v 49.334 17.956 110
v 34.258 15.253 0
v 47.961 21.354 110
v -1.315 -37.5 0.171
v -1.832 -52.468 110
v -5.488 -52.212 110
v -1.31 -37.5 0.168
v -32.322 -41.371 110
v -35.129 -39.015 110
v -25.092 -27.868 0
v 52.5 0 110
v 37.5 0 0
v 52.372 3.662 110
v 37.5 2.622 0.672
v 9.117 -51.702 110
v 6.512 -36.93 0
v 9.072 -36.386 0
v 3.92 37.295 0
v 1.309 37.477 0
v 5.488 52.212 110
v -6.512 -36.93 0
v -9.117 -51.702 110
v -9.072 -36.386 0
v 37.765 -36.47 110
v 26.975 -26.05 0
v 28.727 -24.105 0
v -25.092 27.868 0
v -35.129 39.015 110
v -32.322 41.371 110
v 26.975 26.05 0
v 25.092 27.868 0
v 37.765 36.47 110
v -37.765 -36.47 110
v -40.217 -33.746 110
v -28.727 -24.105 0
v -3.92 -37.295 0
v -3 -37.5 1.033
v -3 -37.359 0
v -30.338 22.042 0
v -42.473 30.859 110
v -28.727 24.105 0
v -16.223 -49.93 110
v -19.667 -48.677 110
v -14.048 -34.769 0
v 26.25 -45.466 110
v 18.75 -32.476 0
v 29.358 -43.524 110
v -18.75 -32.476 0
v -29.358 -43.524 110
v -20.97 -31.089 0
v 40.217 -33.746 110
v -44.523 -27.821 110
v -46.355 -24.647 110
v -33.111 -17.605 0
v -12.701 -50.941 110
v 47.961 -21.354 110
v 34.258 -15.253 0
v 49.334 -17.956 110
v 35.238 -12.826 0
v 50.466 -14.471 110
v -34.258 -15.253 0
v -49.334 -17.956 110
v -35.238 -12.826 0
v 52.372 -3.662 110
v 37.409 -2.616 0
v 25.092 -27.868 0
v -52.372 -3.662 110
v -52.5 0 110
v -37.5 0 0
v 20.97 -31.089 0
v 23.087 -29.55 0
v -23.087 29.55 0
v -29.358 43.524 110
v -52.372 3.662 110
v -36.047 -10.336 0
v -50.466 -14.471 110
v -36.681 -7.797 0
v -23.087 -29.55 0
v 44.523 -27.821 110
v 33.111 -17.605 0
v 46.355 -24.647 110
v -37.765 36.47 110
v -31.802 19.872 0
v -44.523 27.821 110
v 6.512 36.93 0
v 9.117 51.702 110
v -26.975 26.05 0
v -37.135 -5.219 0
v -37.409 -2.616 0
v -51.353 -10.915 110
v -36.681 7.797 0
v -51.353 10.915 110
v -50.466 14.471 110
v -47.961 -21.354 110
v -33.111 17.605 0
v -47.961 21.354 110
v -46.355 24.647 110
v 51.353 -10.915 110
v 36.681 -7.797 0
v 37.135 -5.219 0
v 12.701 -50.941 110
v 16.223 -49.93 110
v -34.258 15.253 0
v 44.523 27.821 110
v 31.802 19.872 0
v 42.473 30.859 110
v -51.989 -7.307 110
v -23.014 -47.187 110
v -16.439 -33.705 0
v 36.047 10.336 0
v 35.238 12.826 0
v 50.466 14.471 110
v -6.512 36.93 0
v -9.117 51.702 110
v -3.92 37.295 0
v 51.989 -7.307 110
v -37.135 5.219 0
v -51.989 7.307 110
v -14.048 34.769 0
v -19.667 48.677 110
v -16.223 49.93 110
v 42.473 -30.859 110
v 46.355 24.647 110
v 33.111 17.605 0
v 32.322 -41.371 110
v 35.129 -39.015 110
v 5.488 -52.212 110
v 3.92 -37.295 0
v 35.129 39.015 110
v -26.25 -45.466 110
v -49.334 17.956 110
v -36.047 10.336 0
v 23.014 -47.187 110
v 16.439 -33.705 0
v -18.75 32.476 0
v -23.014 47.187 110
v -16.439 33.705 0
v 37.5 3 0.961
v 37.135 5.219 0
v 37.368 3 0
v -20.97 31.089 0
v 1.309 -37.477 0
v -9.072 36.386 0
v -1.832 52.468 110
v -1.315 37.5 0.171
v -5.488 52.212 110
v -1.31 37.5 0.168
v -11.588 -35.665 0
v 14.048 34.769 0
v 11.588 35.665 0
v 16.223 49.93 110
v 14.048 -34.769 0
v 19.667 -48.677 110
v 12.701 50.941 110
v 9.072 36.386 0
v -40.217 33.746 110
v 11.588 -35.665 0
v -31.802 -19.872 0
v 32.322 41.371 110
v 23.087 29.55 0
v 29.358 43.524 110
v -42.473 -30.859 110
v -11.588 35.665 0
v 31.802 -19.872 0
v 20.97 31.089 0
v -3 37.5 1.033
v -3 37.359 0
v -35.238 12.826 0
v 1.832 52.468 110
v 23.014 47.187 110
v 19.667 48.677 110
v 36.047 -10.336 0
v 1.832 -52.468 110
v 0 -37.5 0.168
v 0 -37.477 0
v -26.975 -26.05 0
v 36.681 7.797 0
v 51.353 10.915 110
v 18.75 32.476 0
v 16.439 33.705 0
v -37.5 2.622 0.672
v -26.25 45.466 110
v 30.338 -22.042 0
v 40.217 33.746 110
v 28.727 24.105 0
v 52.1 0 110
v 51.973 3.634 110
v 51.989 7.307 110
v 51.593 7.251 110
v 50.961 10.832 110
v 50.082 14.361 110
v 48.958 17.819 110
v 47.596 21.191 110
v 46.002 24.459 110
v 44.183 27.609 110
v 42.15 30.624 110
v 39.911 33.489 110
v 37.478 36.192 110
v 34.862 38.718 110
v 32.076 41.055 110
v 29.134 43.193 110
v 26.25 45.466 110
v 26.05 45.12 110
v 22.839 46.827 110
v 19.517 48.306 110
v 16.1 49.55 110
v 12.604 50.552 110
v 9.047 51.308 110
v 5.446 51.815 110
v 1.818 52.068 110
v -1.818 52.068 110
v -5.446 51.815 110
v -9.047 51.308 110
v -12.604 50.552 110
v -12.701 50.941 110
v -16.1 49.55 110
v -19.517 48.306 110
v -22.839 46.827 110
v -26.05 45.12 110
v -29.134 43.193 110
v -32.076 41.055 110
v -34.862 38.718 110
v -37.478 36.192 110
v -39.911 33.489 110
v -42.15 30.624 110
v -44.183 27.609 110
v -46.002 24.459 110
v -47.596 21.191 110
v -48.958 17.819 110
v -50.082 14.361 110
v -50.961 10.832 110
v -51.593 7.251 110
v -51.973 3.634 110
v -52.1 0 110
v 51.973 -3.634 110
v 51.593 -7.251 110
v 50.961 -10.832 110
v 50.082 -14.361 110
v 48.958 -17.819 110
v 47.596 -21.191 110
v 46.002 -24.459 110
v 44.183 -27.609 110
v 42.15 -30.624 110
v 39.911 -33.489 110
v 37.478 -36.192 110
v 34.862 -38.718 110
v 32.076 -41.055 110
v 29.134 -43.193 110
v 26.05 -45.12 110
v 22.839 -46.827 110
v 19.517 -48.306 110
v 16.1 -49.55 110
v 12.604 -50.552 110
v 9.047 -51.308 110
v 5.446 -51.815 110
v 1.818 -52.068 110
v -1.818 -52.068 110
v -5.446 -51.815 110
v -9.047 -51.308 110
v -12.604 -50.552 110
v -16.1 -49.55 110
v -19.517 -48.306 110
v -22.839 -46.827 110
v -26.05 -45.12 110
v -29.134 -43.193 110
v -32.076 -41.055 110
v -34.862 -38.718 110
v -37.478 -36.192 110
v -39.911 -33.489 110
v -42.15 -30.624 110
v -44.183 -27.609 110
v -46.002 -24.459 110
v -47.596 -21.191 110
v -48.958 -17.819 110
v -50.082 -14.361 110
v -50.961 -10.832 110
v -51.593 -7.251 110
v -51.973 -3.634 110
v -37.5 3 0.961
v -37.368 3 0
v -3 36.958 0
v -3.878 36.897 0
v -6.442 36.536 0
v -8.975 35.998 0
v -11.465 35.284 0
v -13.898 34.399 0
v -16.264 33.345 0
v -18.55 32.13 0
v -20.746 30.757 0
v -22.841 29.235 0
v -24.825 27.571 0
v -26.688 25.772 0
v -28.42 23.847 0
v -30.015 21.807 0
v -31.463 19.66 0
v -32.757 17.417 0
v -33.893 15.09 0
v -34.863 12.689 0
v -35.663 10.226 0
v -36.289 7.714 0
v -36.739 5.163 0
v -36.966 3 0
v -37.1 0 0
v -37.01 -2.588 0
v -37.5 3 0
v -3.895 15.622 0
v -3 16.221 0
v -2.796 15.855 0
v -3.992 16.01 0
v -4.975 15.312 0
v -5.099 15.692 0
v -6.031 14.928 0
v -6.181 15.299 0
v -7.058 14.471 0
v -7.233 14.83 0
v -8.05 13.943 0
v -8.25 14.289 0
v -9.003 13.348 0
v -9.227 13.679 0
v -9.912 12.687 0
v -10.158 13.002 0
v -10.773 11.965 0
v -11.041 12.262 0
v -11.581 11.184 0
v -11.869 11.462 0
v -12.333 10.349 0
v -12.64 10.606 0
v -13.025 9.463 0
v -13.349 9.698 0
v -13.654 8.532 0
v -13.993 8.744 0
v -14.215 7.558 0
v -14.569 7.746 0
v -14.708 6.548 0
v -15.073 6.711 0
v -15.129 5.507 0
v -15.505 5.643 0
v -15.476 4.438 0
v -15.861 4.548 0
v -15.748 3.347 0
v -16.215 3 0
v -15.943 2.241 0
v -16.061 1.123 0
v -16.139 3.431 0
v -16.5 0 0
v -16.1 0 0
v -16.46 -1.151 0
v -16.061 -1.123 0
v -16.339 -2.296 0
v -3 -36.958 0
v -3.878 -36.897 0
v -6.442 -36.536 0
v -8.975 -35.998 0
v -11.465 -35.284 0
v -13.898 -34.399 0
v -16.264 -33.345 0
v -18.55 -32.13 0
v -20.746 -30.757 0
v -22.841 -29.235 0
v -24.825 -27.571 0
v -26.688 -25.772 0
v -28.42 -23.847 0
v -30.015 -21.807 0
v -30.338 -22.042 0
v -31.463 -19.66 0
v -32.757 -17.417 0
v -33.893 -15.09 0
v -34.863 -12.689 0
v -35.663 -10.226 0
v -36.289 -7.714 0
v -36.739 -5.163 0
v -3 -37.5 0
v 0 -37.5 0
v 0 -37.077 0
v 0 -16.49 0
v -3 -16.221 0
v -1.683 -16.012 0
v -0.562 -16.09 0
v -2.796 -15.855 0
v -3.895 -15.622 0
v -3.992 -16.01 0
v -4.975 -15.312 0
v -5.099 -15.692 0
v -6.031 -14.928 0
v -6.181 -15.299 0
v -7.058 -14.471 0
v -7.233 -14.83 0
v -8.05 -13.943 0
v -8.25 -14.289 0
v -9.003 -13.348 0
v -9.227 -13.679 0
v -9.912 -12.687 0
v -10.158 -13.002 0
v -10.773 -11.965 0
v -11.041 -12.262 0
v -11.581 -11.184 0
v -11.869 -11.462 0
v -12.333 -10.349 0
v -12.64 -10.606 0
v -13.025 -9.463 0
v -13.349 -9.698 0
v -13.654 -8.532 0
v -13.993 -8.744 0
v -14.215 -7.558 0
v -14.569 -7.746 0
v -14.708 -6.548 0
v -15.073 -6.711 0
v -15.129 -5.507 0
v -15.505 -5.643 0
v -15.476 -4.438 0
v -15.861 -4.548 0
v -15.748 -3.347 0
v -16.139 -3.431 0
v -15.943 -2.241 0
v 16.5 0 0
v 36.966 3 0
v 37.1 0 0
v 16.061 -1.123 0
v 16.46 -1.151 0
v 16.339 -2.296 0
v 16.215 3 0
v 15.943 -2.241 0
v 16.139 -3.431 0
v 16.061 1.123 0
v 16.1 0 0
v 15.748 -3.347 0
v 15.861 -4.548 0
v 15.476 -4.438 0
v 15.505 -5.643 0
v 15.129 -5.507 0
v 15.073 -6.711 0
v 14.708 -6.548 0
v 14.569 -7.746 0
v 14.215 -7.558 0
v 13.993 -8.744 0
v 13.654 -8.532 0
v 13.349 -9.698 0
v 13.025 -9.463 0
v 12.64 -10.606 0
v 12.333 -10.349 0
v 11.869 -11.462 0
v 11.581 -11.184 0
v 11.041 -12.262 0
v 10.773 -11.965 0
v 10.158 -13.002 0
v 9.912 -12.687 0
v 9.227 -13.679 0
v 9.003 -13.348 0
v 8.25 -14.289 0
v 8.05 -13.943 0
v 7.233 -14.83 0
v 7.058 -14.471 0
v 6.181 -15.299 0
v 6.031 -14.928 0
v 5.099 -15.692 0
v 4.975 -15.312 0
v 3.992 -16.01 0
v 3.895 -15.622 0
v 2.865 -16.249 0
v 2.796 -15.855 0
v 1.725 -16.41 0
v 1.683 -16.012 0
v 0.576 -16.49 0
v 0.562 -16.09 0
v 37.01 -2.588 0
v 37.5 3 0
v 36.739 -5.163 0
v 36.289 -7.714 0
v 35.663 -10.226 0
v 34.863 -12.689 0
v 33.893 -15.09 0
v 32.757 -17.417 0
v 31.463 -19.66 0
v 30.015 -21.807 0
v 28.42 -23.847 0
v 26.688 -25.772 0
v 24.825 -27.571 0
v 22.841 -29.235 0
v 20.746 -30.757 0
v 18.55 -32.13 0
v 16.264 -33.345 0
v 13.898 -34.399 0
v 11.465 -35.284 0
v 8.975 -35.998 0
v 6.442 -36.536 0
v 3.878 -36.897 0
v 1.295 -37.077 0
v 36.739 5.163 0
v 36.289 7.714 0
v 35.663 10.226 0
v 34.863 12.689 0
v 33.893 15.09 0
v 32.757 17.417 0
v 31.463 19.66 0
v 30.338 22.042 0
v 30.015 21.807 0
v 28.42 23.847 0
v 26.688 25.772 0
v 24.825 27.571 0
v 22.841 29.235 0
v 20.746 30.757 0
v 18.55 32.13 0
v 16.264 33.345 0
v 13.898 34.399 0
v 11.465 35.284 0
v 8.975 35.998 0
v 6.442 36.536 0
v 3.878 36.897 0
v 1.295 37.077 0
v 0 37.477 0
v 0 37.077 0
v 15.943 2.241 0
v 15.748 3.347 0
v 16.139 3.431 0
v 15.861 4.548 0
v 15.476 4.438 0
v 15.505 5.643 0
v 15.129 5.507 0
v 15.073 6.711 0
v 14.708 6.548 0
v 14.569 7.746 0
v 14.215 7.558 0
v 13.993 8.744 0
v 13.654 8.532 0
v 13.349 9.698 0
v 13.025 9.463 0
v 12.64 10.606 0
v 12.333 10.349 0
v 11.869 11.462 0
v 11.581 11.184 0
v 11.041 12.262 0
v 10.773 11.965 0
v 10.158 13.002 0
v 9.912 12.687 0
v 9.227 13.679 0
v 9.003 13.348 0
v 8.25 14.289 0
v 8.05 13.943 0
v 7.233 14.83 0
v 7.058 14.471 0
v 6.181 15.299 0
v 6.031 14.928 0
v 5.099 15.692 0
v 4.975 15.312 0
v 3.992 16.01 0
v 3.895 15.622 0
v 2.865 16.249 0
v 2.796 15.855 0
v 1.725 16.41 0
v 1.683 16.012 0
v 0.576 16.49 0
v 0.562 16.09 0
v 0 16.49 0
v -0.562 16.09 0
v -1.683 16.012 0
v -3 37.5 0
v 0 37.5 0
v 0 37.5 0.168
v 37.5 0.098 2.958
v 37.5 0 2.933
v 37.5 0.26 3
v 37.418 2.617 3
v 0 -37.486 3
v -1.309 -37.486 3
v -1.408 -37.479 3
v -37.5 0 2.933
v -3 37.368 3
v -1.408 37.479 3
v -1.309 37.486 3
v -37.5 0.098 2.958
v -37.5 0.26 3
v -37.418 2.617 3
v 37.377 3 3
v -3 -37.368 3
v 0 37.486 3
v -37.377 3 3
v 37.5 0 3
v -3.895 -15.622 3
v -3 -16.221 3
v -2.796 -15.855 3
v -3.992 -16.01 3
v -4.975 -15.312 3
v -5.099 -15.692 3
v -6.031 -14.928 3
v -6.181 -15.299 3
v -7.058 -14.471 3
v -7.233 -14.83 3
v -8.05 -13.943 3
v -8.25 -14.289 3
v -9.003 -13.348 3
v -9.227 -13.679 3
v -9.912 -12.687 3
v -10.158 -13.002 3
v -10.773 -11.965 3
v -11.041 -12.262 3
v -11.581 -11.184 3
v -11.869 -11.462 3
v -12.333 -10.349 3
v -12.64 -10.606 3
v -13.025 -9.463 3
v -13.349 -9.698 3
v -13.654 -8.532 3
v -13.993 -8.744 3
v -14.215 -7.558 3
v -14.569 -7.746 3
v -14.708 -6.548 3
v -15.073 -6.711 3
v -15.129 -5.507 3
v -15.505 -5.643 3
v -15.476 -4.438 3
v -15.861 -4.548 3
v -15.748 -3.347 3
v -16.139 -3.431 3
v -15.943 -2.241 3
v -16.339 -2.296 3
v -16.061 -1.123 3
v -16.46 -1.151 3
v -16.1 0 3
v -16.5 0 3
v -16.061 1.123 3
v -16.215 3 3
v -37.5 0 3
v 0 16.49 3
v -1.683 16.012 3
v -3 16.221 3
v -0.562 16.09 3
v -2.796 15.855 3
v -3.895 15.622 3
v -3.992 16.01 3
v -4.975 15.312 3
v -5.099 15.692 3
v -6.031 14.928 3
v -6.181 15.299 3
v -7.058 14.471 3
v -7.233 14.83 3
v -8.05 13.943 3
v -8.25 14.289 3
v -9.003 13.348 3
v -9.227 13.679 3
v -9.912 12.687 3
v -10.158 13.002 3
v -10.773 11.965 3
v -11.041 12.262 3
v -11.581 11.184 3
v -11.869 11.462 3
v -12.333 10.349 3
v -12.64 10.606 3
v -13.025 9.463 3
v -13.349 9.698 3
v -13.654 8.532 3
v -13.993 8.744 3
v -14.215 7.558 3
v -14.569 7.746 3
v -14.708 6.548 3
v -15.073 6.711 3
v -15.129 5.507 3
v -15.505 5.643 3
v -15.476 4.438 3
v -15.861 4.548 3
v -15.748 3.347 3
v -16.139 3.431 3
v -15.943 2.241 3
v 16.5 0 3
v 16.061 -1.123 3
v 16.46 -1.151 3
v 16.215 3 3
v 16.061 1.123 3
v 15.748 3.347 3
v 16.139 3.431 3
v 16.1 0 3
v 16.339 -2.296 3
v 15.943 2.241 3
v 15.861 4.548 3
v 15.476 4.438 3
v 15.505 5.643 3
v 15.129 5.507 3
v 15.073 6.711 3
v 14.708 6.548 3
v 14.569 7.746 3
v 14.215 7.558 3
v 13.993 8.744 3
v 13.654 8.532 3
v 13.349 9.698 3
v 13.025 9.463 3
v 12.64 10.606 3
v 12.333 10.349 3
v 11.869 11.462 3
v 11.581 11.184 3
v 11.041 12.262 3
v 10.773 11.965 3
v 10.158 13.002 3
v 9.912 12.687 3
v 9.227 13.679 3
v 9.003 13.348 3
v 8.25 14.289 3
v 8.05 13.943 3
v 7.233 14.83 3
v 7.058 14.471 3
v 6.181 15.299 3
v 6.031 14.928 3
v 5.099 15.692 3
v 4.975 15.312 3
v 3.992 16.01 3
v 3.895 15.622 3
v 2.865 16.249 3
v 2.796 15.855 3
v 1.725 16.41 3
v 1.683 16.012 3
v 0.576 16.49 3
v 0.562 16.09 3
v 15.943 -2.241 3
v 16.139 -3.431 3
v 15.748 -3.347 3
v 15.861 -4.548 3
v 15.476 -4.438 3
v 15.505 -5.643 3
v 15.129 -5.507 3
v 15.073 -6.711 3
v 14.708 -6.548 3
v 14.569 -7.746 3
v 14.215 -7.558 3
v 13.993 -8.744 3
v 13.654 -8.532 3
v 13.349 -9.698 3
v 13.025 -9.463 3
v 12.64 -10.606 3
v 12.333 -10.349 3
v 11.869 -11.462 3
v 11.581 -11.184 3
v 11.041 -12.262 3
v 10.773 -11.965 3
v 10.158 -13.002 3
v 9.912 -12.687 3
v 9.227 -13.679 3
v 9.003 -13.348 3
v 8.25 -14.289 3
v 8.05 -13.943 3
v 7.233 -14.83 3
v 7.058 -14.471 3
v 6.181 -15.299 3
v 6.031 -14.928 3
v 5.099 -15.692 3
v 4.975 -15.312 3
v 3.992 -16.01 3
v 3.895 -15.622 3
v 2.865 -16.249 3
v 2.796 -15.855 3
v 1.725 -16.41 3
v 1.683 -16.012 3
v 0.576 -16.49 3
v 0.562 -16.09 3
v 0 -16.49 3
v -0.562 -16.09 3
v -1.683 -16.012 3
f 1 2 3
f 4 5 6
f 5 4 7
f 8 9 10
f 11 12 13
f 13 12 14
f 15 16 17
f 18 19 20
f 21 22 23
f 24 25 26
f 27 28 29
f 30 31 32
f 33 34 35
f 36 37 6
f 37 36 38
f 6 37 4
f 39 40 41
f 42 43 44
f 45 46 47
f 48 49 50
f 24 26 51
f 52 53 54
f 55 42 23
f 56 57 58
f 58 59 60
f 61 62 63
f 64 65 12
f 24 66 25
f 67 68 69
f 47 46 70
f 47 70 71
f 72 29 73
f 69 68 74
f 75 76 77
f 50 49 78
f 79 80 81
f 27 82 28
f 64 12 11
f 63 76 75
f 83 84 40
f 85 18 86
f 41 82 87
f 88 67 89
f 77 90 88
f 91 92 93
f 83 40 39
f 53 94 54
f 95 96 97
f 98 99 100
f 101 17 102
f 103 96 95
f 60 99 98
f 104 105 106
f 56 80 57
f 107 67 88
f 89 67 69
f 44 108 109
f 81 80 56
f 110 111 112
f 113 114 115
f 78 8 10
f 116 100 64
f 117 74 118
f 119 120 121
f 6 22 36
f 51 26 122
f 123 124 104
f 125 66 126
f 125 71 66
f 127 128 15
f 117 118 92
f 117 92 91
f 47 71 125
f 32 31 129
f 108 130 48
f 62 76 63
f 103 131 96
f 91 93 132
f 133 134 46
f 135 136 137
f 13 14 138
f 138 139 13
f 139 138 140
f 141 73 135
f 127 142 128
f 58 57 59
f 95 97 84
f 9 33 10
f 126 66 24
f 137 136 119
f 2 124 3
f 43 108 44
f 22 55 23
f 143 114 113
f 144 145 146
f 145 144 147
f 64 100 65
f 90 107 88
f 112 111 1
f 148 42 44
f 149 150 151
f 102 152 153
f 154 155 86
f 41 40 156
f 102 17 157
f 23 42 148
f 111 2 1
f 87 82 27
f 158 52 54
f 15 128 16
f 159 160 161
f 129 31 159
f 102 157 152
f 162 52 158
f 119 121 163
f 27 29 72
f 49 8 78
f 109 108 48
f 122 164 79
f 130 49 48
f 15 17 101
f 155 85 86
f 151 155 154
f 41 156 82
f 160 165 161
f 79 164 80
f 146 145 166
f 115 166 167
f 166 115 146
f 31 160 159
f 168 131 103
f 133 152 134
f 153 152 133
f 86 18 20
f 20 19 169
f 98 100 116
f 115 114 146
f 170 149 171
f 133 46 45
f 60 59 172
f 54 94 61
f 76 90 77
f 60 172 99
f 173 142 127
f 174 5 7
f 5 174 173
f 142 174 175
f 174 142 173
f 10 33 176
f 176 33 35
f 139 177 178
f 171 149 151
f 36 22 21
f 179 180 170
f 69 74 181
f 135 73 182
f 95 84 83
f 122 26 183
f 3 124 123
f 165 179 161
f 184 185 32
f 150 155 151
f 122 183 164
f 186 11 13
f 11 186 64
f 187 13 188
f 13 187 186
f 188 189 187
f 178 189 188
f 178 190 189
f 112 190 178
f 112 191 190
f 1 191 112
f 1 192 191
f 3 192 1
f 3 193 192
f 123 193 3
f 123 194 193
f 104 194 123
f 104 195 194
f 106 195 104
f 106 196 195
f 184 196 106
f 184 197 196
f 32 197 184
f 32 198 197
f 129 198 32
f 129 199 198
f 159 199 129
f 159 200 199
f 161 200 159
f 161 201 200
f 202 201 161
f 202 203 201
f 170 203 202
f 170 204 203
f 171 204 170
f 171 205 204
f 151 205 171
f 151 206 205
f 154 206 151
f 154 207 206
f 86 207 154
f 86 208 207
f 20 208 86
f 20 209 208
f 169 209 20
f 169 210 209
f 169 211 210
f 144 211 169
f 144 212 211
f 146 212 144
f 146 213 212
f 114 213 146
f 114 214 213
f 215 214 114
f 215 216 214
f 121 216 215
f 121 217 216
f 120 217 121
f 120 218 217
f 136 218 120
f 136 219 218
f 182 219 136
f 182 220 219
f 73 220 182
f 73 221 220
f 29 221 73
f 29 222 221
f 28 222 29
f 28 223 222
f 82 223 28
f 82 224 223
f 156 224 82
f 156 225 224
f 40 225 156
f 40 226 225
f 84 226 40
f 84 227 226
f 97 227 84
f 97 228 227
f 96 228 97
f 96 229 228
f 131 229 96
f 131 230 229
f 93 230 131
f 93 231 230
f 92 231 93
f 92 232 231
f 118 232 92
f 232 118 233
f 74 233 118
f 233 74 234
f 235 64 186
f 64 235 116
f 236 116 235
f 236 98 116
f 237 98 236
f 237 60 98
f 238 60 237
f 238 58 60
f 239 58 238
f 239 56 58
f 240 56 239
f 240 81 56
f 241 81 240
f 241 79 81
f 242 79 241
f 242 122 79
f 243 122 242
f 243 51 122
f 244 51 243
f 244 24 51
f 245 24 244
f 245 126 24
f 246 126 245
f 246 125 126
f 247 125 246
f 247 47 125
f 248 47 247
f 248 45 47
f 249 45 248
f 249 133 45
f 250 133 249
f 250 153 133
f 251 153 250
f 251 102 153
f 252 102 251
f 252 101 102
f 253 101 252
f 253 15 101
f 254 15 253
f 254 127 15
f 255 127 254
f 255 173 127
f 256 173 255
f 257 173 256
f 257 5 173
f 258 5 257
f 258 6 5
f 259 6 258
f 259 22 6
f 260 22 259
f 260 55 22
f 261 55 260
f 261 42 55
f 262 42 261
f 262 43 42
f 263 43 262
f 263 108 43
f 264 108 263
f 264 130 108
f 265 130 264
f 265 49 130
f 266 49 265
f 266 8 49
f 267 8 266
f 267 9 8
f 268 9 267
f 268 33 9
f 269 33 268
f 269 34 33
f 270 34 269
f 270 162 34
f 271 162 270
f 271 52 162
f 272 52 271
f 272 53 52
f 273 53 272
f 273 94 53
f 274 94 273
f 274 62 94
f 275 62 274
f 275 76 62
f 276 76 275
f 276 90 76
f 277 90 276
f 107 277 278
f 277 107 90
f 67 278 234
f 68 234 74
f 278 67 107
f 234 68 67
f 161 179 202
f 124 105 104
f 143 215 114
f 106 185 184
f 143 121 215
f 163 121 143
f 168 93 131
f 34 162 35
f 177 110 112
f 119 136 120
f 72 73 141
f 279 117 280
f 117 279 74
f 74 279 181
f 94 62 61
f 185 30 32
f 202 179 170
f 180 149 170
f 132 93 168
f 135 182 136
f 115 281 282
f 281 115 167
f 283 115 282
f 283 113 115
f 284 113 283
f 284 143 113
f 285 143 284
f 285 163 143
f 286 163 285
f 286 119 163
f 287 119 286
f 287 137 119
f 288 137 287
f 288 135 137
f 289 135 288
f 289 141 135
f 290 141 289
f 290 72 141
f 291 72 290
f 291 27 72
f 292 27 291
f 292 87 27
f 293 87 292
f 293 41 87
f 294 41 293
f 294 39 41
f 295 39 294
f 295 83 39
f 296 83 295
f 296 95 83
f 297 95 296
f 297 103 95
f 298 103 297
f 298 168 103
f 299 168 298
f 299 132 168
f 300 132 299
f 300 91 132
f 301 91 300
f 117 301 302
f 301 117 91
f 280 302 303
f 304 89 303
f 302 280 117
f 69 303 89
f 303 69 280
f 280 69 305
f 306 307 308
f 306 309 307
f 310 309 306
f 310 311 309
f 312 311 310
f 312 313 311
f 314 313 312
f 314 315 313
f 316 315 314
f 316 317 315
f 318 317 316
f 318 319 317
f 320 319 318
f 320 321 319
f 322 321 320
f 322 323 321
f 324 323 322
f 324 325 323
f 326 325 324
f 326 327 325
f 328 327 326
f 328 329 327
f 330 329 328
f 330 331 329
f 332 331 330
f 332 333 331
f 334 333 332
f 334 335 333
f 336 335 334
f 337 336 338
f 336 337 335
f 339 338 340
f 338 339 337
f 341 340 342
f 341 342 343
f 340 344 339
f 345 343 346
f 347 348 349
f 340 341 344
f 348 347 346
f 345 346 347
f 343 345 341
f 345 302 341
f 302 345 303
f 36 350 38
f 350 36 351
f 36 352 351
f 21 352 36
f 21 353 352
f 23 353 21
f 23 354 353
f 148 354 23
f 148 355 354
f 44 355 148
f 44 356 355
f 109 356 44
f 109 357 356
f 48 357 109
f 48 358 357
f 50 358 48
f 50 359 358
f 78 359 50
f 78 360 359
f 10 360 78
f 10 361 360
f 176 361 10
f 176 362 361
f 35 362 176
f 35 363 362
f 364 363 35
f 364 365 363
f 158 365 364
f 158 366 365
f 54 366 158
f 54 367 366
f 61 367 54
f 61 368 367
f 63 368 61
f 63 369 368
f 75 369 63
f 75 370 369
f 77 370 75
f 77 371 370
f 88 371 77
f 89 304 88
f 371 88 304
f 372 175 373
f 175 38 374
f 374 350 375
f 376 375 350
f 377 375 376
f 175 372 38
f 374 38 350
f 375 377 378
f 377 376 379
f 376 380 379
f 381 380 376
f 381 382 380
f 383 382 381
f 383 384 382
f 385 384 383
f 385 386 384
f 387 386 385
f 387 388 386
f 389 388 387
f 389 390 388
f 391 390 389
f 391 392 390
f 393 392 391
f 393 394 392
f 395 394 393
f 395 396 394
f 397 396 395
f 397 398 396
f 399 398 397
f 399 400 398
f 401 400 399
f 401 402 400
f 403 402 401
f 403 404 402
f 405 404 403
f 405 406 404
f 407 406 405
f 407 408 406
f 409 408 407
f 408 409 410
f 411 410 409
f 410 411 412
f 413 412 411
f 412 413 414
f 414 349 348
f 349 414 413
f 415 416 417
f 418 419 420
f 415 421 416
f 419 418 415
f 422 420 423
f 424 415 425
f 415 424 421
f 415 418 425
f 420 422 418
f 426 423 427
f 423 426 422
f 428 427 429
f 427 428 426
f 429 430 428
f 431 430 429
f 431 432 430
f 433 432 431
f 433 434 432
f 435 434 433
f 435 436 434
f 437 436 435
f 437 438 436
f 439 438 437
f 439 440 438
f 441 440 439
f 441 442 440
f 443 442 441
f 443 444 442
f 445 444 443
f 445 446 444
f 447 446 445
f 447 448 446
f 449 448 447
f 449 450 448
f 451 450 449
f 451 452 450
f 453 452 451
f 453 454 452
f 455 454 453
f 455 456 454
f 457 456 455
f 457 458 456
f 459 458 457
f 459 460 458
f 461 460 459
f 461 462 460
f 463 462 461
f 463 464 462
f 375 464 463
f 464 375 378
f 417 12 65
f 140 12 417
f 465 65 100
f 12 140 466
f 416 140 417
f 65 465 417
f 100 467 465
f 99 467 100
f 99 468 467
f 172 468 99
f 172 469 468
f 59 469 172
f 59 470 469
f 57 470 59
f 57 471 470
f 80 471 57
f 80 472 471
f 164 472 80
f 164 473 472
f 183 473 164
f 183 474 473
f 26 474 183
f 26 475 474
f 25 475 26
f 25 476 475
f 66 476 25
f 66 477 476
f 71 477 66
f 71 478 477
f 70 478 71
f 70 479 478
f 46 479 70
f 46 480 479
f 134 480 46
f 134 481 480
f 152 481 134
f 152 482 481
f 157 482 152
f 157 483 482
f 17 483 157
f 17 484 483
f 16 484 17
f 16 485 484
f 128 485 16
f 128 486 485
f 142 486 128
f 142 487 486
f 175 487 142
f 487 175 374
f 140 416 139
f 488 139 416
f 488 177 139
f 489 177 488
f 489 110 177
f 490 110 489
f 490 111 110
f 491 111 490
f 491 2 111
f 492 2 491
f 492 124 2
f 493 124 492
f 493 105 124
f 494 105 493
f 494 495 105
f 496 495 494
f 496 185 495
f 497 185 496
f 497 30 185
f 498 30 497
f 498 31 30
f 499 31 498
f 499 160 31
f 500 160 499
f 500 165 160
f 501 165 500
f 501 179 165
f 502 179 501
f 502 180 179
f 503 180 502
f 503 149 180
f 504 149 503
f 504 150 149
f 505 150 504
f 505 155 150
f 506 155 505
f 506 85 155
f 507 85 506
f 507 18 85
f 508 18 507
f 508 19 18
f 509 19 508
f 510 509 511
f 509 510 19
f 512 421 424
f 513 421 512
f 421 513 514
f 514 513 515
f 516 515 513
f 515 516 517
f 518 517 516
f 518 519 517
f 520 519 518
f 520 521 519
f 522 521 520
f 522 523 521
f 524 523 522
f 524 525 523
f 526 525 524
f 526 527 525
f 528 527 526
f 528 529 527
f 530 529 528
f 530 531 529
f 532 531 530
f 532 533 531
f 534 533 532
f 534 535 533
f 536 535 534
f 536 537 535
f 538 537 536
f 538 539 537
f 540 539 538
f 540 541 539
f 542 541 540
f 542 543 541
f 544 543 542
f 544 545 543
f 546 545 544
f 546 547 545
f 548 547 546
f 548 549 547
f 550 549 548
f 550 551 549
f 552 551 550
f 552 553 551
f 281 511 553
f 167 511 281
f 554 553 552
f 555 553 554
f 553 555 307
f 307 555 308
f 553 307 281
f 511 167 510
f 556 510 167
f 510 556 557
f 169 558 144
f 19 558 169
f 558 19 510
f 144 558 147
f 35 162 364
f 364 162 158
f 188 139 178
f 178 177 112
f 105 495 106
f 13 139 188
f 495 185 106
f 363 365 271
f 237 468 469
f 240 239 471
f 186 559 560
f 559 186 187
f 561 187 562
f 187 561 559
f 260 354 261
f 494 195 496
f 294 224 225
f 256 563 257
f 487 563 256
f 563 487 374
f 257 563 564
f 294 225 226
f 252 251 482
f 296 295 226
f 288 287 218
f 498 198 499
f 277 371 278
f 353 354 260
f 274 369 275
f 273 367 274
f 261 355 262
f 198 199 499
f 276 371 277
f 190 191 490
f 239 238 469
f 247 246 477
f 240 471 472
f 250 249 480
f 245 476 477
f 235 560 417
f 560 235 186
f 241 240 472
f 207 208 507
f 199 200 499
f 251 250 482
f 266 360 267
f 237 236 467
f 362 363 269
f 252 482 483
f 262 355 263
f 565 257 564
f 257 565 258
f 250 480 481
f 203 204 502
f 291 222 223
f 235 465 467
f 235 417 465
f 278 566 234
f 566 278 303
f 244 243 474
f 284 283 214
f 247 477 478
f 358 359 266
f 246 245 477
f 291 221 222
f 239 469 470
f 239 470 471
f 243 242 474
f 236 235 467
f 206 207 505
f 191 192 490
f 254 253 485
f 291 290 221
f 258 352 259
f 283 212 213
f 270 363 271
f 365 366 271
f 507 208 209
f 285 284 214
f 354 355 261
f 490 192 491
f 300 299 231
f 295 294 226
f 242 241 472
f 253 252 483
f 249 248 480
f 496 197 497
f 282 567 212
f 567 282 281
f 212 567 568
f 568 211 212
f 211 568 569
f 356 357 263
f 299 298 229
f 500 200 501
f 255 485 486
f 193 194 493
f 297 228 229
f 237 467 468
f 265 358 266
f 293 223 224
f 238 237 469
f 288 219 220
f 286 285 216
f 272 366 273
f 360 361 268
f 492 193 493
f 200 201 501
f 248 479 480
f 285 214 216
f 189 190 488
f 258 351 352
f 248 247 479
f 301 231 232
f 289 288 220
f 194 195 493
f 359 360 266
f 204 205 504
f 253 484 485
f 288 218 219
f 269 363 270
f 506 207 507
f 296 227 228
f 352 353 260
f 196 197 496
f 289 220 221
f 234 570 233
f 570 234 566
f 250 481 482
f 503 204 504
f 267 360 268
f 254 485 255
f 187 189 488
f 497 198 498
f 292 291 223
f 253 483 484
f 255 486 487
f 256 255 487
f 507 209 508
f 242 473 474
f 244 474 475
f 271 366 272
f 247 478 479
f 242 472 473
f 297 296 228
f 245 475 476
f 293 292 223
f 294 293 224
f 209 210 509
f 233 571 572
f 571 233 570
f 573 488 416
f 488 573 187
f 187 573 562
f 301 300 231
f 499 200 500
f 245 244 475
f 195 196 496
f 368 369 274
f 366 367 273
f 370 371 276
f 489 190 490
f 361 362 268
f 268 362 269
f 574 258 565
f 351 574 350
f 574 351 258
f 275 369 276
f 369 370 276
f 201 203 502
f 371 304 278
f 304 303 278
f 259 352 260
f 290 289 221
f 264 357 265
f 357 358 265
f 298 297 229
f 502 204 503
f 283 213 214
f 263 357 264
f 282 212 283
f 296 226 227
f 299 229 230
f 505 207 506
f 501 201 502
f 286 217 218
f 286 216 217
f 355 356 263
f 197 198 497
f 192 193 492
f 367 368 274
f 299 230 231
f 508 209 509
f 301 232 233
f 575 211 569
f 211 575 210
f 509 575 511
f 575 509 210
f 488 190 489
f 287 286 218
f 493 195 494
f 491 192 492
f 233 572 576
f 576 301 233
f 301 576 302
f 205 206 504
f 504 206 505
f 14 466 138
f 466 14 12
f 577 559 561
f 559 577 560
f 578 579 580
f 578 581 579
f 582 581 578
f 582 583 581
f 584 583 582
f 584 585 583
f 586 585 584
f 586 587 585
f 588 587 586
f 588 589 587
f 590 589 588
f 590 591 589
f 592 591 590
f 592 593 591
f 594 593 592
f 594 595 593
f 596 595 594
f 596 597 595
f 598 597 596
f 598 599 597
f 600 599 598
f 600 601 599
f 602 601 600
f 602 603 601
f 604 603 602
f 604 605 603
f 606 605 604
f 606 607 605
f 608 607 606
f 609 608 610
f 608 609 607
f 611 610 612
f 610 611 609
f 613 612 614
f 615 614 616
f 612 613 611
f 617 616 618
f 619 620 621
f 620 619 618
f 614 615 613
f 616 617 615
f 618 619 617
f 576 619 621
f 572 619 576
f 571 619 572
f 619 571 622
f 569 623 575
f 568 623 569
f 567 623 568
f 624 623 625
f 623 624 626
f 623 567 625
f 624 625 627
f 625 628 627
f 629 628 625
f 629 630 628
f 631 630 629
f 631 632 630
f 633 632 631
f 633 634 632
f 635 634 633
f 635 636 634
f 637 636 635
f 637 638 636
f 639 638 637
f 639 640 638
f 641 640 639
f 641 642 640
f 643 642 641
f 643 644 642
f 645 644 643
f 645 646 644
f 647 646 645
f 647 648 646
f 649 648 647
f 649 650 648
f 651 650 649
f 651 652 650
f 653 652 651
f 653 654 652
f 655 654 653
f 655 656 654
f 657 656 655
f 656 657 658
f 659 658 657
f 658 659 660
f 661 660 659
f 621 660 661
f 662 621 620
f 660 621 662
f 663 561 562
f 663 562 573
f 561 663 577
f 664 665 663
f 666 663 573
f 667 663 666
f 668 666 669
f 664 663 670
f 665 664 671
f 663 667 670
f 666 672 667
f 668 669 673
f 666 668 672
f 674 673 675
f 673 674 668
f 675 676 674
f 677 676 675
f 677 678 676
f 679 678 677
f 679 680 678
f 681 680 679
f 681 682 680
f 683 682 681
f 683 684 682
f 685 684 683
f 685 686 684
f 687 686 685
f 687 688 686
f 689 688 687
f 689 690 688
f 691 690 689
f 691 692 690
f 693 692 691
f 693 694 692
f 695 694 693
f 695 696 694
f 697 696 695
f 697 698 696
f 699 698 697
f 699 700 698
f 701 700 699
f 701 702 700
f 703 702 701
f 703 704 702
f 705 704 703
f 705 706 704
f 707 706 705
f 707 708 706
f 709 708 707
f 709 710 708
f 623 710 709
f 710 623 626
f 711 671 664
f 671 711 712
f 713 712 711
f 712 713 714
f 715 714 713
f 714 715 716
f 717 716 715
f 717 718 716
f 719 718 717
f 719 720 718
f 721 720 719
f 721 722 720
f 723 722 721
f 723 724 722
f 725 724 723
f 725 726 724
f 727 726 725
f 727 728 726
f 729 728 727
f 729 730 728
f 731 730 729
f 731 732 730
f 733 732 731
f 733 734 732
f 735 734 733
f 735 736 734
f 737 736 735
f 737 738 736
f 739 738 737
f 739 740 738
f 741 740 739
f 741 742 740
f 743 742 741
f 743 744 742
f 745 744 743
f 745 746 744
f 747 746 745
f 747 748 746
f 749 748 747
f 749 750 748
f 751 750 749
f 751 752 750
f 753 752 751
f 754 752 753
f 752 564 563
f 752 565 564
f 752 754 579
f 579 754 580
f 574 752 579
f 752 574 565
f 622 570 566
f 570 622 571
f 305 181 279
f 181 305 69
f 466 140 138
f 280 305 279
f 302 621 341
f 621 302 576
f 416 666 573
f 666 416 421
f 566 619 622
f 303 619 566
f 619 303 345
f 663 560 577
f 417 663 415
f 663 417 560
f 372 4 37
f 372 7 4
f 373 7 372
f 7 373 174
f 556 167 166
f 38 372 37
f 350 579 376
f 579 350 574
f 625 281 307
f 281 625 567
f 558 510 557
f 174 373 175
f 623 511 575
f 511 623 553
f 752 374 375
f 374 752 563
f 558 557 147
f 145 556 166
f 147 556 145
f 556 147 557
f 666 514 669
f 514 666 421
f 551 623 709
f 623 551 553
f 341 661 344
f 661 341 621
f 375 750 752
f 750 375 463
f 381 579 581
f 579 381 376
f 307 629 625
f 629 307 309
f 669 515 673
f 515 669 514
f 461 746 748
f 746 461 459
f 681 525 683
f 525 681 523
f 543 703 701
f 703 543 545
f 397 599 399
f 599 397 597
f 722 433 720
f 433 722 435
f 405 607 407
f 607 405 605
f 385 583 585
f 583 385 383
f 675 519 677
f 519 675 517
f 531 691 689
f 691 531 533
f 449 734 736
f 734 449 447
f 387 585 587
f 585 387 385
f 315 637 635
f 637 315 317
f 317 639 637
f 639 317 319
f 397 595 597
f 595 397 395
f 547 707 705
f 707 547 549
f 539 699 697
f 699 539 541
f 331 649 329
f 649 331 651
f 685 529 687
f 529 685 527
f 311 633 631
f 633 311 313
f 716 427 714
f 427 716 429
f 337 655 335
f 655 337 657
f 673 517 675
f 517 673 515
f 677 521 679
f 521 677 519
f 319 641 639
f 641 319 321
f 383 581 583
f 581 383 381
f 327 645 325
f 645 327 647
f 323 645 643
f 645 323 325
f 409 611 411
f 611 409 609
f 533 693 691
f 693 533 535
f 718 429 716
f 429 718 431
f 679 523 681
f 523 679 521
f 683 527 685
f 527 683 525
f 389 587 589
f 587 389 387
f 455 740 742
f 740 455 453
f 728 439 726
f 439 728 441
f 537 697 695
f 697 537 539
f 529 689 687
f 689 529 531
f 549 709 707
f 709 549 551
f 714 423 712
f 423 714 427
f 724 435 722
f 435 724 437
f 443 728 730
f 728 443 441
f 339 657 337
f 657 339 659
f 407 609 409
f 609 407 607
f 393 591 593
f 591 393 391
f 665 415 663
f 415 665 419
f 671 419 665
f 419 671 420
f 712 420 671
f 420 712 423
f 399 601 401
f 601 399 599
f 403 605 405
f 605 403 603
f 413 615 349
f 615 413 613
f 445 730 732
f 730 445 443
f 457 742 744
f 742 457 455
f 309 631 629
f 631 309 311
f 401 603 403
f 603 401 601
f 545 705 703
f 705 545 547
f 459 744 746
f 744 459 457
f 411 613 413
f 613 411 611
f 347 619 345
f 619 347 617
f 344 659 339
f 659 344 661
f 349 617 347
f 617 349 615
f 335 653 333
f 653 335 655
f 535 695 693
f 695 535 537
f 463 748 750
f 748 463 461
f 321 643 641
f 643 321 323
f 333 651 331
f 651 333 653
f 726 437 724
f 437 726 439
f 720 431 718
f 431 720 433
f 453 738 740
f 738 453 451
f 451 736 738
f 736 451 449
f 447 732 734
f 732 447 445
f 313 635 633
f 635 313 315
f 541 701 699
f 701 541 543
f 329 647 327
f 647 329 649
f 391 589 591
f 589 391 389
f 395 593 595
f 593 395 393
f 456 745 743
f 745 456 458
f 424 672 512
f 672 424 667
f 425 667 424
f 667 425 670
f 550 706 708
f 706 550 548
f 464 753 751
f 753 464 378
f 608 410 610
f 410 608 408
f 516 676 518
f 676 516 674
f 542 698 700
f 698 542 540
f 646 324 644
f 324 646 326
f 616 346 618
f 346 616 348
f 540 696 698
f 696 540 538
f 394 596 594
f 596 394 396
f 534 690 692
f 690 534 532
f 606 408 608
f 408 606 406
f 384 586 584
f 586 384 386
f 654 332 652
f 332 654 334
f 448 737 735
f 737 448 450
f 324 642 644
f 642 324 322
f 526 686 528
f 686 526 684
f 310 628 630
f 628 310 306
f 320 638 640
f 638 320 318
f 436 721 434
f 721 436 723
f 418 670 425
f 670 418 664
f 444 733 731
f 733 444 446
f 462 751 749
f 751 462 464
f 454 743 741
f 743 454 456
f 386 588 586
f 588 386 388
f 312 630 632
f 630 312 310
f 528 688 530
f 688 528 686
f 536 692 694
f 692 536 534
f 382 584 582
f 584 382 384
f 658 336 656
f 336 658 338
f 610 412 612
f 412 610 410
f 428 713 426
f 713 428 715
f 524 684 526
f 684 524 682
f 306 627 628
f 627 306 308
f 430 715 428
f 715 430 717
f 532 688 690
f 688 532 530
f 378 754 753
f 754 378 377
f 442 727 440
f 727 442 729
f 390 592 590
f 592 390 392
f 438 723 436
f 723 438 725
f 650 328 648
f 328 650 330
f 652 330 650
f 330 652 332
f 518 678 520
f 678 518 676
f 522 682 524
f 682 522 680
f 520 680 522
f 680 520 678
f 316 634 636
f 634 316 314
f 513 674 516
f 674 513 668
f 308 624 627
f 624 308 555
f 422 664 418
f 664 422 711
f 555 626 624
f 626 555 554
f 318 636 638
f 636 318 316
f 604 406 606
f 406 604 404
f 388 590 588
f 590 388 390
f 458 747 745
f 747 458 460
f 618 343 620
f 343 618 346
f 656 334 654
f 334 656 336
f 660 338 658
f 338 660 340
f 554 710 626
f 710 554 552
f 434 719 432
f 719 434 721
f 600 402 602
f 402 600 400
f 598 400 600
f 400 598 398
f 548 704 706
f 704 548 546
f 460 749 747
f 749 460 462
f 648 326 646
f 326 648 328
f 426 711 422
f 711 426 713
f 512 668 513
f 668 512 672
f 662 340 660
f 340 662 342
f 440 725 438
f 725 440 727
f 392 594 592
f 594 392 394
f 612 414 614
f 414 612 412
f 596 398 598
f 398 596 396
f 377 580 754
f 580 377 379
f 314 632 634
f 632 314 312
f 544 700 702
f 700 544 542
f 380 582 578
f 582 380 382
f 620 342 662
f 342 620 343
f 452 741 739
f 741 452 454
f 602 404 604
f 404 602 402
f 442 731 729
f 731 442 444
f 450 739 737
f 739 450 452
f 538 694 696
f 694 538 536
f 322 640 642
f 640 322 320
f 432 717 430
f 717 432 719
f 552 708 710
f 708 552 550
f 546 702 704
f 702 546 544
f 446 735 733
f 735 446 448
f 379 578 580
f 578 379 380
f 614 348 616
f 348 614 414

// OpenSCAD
//
//  LightBulb Shade
//
//  EvilTeach
//
//  1/30/2016
//
// fill 0%
// layer .2
// no shells
// feed 50
// travel 80
//
// 6.33 meters of filament
// about 2 hours to print

// Build with 90 line segments for the circle
$fn = 90;

// Diameter of the small end of the shade
shadeDiameter  =  75.0;
shadeRadius    = shadeDiameter / 2;

// The height of the shade
shadeHeight    = 110.0;

// My smallest extruder size
shadeThickness =  0.4;

// diameter of the part that grips the bulb
holderDiameter = 33;
holderRadius = holderDiameter / 2;

// Height of the support
holderHeight = 3;


main();



module main()
{
    shade();
    holder();
}



module shade()
{
    difference()
    {
        cylinder(r1 = shadeRadius,
                 r2 = shadeRadius + 15, 
                 shadeHeight);
        cylinder(r1 = shadeRadius - shadeThickness, 
                 r2 = shadeRadius - shadeThickness + 15,
                 shadeHeight);
    }
}



module holder()
{
    difference()
    {
        union()
        {
            translate([-shadeRadius, 0, 0])
                cube([shadeDiameter, holderHeight, holderHeight]);

            translate([0, -shadeRadius, 0])
                rotate([0, 0, 90])
                    cube([shadeDiameter, holderHeight, holderHeight]);
        }

        cylinder(r = holderRadius, holderHeight);
    }

    difference()
    {
        cylinder(r = holderRadius, holderHeight);
        cylinder(r = holderRadius - shadeThickness, holderHeight);
    }
}
